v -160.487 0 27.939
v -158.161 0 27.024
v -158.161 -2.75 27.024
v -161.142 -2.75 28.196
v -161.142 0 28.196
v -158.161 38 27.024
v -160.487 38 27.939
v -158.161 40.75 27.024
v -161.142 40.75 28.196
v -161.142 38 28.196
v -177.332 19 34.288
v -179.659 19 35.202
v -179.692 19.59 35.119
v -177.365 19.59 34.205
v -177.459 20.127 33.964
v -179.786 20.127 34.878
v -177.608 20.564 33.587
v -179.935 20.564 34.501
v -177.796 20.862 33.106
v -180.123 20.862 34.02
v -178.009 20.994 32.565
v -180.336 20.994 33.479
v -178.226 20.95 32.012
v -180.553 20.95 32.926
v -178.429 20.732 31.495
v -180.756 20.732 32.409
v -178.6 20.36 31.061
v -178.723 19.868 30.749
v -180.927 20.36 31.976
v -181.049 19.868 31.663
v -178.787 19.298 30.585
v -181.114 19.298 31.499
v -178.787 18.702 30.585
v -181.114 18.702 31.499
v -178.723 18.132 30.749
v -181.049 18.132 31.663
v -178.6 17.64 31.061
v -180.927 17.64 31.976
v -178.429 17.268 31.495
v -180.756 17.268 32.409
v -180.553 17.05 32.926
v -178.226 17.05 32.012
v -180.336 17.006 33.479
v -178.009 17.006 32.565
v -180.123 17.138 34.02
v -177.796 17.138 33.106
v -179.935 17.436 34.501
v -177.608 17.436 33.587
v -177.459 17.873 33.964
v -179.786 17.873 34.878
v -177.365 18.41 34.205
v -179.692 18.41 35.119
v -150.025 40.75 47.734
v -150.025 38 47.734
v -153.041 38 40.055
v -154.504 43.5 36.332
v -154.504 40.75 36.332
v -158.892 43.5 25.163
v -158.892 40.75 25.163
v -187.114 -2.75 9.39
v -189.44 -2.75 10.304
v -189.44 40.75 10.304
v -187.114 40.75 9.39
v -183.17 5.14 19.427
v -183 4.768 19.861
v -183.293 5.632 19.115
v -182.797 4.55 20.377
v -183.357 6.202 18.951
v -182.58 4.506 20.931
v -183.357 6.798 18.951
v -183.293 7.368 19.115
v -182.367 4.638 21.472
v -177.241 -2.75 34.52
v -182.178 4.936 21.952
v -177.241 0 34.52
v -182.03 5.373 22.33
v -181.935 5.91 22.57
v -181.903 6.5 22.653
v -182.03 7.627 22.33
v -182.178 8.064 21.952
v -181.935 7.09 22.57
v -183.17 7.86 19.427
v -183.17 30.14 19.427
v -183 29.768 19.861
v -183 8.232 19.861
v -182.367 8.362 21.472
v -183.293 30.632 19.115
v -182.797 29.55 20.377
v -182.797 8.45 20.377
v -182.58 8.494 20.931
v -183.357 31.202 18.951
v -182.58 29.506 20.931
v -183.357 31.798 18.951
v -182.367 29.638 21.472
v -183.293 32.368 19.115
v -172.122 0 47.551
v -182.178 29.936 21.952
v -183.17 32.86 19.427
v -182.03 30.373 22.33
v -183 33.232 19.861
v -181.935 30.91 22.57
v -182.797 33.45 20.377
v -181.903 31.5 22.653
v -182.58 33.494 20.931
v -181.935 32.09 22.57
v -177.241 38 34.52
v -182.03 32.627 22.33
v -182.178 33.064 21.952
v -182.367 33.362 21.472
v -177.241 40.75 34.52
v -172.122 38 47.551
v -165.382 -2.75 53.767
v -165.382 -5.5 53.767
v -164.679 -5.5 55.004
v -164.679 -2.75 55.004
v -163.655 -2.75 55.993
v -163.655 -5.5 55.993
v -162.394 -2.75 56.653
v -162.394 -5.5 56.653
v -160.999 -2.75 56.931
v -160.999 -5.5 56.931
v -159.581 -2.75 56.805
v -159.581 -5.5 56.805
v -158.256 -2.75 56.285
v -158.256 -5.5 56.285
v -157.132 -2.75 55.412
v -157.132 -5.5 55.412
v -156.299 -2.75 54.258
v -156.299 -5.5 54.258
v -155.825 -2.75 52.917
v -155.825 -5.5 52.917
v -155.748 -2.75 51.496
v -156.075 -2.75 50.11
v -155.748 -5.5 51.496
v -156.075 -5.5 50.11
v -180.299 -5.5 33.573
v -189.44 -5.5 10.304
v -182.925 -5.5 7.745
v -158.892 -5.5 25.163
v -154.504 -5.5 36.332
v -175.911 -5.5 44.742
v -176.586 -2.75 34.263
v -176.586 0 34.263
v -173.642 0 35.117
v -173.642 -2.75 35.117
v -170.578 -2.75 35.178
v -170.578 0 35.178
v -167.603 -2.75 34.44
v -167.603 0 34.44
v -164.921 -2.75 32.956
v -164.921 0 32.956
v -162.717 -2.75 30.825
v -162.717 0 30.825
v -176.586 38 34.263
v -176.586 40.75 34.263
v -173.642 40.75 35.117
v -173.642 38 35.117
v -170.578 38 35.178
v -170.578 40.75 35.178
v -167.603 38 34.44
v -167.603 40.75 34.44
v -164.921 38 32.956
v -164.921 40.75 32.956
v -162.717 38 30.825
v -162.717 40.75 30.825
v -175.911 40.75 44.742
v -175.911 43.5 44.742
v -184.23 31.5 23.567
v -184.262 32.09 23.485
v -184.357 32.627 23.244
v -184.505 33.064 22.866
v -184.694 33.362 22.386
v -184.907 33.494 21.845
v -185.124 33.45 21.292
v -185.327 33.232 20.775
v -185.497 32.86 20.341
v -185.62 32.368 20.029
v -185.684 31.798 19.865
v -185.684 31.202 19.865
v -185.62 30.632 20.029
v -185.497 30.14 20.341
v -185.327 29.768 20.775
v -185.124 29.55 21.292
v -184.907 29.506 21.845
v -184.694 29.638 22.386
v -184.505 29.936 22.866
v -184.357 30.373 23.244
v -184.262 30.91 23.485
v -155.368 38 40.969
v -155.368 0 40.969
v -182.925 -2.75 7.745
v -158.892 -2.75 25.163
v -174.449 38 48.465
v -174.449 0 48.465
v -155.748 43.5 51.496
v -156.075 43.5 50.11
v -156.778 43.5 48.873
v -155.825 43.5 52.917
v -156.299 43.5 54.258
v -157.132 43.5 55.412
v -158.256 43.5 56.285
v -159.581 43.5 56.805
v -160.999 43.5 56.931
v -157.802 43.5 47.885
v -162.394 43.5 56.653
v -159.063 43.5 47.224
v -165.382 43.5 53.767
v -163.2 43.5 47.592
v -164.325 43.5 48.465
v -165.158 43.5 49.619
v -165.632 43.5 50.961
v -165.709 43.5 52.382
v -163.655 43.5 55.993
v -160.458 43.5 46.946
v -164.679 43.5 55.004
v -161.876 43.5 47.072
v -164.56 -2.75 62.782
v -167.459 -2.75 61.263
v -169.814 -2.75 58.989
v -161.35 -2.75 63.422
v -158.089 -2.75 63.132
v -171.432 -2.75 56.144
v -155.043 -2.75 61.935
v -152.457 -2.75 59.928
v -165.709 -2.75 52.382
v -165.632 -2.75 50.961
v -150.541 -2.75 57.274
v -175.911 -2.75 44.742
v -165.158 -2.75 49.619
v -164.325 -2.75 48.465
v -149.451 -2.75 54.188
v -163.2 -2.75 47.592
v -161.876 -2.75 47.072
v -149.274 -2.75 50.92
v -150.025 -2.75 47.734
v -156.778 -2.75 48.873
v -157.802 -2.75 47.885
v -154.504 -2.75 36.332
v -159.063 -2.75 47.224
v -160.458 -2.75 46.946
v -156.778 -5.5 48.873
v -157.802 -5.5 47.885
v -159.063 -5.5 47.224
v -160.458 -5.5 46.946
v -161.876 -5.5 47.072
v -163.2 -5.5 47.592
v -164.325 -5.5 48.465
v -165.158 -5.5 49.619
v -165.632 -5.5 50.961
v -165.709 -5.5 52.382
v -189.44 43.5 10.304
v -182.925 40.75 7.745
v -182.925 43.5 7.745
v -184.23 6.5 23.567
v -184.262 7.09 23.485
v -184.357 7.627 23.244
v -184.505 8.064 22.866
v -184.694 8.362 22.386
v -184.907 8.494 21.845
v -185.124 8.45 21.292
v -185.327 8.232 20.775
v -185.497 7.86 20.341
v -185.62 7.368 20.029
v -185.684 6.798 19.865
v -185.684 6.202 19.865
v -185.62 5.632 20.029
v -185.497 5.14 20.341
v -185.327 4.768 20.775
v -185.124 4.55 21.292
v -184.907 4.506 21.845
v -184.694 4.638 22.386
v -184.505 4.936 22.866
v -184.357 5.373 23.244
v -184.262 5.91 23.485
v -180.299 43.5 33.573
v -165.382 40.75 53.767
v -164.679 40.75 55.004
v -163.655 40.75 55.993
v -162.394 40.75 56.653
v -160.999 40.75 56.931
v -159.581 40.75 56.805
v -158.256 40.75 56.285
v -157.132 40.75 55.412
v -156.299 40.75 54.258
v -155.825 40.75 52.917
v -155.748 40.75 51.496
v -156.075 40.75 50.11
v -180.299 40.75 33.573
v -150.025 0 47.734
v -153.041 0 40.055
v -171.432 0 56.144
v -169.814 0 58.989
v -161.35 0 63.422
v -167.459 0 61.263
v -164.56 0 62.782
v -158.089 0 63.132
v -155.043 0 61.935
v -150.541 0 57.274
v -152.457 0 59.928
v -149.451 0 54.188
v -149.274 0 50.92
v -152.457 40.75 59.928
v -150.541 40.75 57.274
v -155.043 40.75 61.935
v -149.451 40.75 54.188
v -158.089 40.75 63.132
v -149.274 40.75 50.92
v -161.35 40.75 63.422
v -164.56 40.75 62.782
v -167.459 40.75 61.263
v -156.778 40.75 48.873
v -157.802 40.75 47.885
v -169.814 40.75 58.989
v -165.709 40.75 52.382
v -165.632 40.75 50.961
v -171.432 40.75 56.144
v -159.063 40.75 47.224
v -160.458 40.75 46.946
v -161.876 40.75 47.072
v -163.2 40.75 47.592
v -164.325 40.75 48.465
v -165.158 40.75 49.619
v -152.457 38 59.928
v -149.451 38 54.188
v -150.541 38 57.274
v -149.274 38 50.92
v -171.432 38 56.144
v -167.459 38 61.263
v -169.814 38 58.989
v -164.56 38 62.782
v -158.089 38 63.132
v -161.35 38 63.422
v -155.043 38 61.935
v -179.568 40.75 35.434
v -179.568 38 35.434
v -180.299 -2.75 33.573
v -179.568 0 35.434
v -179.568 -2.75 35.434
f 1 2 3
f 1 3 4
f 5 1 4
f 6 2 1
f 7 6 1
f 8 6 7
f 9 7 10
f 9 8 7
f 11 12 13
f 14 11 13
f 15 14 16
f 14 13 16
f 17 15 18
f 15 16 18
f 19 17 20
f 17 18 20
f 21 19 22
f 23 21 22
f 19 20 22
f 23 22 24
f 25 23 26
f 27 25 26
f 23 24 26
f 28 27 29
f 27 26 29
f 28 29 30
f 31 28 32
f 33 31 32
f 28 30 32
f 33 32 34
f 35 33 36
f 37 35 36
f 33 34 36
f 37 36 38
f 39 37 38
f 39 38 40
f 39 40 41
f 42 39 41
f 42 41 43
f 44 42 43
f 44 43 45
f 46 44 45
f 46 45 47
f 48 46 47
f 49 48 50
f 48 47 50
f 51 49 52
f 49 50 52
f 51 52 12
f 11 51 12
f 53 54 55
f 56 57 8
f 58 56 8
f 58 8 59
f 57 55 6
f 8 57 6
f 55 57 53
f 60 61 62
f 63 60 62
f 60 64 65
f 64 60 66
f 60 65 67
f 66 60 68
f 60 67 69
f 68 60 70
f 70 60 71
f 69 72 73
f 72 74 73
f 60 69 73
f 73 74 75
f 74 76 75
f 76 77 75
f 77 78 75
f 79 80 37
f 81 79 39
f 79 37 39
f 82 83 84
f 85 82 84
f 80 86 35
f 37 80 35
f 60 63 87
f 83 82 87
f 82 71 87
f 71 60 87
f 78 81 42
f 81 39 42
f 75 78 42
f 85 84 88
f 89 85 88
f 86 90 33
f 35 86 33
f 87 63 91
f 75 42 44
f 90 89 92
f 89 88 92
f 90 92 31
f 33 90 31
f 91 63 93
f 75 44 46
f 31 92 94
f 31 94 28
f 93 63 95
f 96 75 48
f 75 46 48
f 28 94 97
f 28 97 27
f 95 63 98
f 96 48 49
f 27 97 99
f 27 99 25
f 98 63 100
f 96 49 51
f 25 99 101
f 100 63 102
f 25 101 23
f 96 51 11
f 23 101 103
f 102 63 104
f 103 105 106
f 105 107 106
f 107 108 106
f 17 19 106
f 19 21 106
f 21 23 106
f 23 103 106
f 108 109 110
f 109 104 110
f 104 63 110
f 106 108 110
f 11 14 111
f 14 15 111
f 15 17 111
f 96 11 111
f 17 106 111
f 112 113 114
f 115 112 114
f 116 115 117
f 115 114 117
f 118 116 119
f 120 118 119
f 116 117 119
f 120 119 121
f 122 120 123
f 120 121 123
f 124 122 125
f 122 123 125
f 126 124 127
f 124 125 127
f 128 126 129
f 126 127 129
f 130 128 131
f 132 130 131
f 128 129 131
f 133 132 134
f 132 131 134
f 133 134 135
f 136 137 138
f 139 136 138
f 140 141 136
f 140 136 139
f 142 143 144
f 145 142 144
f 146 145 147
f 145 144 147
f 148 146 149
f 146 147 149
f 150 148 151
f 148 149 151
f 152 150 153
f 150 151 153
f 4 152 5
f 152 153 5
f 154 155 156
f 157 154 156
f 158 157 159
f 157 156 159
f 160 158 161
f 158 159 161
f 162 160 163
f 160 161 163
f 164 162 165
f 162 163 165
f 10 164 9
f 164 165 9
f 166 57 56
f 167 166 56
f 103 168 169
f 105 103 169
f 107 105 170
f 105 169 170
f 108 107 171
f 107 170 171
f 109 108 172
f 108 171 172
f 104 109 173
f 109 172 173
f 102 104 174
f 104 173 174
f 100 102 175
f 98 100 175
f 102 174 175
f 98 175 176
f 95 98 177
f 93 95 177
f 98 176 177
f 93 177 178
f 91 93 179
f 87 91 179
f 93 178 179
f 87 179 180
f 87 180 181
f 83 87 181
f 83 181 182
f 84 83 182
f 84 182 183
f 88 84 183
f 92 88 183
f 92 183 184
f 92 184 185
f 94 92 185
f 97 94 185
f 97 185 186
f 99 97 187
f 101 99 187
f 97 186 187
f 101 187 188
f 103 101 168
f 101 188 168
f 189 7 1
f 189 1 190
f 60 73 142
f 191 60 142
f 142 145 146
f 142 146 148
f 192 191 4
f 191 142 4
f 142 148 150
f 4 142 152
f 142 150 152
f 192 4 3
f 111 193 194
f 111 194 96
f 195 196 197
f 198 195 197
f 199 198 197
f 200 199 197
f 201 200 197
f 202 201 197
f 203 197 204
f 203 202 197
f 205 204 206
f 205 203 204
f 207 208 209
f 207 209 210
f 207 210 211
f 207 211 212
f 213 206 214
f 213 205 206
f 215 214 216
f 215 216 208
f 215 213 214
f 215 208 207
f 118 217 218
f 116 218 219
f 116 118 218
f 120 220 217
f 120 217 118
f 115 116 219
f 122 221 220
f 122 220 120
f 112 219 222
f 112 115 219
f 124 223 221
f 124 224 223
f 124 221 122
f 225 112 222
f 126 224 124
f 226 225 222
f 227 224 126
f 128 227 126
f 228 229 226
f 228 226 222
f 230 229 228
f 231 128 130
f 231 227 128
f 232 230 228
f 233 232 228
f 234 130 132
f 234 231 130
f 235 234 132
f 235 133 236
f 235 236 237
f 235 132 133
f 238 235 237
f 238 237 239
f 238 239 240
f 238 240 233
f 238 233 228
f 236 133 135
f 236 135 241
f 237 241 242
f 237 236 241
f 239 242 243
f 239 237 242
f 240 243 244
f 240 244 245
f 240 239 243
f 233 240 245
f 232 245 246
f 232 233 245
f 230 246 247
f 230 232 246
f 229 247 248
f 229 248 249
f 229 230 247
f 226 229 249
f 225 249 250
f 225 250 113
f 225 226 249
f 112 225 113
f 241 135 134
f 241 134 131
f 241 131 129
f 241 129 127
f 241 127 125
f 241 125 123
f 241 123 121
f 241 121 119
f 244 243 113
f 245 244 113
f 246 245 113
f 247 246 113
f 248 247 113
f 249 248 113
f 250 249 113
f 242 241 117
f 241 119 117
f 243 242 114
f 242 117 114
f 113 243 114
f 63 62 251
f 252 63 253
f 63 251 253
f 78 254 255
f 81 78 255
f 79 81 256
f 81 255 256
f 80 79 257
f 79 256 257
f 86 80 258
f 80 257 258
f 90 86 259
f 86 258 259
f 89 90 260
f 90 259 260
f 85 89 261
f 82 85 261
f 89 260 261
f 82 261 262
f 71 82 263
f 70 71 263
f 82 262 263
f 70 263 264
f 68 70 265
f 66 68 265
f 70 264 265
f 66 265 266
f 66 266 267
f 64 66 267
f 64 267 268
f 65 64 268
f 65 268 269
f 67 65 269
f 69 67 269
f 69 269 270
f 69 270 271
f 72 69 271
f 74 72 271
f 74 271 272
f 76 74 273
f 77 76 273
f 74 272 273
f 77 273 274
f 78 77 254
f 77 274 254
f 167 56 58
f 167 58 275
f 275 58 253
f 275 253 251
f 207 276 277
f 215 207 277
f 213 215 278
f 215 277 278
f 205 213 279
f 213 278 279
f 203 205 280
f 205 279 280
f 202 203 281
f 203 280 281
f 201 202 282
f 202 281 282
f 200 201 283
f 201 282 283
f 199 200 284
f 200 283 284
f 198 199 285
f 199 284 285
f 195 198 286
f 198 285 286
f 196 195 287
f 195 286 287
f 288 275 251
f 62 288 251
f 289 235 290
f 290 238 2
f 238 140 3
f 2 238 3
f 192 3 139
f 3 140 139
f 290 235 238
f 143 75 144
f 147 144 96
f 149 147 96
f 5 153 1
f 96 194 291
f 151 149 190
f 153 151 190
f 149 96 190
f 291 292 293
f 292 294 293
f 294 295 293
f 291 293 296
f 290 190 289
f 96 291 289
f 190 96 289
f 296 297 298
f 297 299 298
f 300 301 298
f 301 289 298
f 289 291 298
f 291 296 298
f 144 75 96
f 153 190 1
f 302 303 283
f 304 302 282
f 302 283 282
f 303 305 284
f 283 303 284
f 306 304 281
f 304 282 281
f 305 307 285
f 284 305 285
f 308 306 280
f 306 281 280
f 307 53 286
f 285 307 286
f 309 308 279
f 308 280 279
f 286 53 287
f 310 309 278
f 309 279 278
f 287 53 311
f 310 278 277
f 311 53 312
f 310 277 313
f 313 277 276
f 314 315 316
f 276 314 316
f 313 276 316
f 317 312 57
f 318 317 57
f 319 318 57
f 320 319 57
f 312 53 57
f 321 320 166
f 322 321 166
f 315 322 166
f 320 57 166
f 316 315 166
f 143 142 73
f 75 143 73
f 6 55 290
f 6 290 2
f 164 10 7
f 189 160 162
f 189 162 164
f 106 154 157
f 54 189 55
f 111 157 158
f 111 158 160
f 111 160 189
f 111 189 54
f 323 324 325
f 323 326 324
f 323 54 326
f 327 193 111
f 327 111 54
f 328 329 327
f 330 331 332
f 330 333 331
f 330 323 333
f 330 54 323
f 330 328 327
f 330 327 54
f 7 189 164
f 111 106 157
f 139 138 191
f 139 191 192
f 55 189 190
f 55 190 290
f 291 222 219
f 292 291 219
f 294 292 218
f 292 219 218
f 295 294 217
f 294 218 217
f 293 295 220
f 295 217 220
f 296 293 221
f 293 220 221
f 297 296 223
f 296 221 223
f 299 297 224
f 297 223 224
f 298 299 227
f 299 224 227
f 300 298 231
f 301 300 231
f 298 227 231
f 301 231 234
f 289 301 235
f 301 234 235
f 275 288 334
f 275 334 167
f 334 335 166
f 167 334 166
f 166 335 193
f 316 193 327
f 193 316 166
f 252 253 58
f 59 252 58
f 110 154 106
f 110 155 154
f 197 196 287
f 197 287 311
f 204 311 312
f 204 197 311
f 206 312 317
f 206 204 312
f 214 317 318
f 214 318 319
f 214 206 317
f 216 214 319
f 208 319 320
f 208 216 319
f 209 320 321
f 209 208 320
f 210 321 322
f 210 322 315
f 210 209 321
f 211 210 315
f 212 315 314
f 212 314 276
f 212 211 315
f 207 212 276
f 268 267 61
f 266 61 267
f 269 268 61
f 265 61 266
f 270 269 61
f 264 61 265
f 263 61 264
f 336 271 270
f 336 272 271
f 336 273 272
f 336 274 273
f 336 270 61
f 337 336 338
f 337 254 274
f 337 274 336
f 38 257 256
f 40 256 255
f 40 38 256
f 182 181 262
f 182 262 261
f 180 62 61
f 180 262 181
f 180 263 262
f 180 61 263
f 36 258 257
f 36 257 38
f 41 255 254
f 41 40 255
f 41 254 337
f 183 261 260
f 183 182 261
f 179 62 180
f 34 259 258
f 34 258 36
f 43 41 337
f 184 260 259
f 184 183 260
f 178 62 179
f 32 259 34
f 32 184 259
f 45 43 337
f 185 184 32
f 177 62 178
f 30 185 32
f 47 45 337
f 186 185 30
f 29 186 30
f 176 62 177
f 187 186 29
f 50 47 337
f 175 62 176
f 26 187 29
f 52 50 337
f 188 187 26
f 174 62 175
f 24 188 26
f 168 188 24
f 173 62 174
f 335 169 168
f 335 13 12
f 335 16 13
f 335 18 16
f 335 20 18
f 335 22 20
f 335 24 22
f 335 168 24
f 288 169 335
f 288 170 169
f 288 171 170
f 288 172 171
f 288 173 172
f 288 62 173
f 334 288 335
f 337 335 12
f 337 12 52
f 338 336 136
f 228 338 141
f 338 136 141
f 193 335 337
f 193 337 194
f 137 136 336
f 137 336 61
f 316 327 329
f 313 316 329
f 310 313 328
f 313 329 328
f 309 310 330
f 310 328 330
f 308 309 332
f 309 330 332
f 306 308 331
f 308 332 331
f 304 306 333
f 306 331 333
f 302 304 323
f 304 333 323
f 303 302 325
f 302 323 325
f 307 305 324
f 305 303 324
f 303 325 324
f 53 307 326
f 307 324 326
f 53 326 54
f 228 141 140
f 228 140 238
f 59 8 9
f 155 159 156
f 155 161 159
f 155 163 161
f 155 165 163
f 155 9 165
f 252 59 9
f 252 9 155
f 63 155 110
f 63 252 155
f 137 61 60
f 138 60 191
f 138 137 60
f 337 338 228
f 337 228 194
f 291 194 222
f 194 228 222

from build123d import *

# Parameters (mm, degrees)
SALIENTE_EXTRUIR1_START   = -2.75
SALIENTE_EXTRUIR1_DEPTH   = 5.5
SALIENTE_EXTRUIR1_2_DEPTH = 2.75
SALIENTE_EXTRUIR2_DEPTH   = 38
SALIENTE_EXTRUIR3_START   = 2.75
SALIENTE_EXTRUIR3_DEPTH   = 2.75
CROQUIS4_W                = 23
CROQUIS4_H                = 43.5
CORTAR_EXTRUIR1_DEPTH     = 8.25
CORTAR_EXTRUIR2_DEPTH     = 2.75
CROQUIS6_W                = 38
CROQUIS6_H                = 22.249999999
CORTAR_EXTRUIR3_DEPTH     = 16.59246817
CROQUIS7_W                = 3.203765914
CROQUIS7_H                = 38
CORTAR_EXTRUIR4_DEPTH     = 8.25
CROQUIS8_W                = 3.203765916
CROQUIS8_H                = 38
CORTAR_EXTRUIR5_DEPTH     = 8.25
CROQUIS9_W                = 14
CROQUIS9_H                = 38
CORTAR_EXTRUIR6_DEPTH     = 0.703765915
CROQUIS10_W               = 14
CROQUIS10_H               = 38
CORTAR_EXTRUIR7_DEPTH     = 0.703765915
SALIENTE_EXTRUIR4_START   = 2.75
SALIENTE_EXTRUIR4_DEPTH   = 2.75
CORTAR_EXTRUIR8_DEPTH     = 2.75
CROQUIS13_W               = 12.249999999
CROQUIS13_H               = 2.75
CORTAR_EXTRUIR9_DEPTH     = 74.034358614
CROQUIS14_W               = 12.249999999
CROQUIS14_H               = 2.75
CORTAR_EXTRUIR10_DEPTH    = 74.034358614
CROQUIS15_W               = 5
CROQUIS15_H               = 2.75
CROQUIS16_W               = 5
CROQUIS16_H               = 2.75
TALADRO1_D                = 10.15
TALADRO1_DEPTH            = 2.75
TALADRO2_D                = 10.15
CORTAR_EXTRUIR11_DEPTH    = 2.75
CORTAR_EXTRUIR12_START    = -2.75
CORTAR_EXTRUIR12_DEPTH    = 2.75
CORTAR_EXTRUIR13_REACH    = 202.135
SALIENTE_EXTRUIR5_DEPTH   = 2.75
SALIENTE_EXTRUIR6_DEPTH   = 2.75
CROQUIS26_W               = 27
CROQUIS26_H               = 43.5
SALIENTE_EXTRUIR7_DEPTH   = 2.5
CROQUIS27_R               = 2
CORTAR_EXTRUIR14_DEPTH    = 2.5


with BuildPart() as part:
    # Saliente-Extruir1: read off the stored shape, not the designer's step
    # Saliente-Extruir1 outline → Saliente-Extruir1 (new body)
    with BuildSketch(Plane(origin=(0, 40.75, 0), x_dir=(-1, 0, 0), z_dir=(0, 1, 0)).offset(SALIENTE_EXTRUIR1_START)):
        with BuildLine():
            Line((161.177139208, 19.345694485), (182.584423689, 27.755698719))
            Line((182.584423689, 27.755698719), (171.432026769, 56.143619441))
            ThreePointArc((171.432026769, 56.143619441), (156.523382412, 62.642259564), (150.024742289, 47.733615207))
            Line((150.024742289, 47.733615207), (161.177139208, 19.345694485))
        make_face()
    extrude(amount=SALIENTE_EXTRUIR1_DEPTH)

    # Saliente-Extruir1 2 outline → Saliente-Extruir1 2 (add)
    with BuildSketch(Plane(origin=(0, 40.75, 0), x_dir=(-1, 0, 0), z_dir=(0, 1, 0))):
        with BuildLine():
            ThreePointArc((161.177139208, 19.345694485), (176.085783565, 12.847054362), (182.584423687, 27.755698719))
            Line((182.584423687, 27.755698719), (161.177139208, 19.345694485))
        make_face()
    extrude(amount=SALIENTE_EXTRUIR1_2_DEPTH)

    # Croquis2 → Saliente-Extruir2 (add)
    with BuildSketch(Plane.XZ.offset(-38)):
        Polygon((-171.432026768, 56.143619442), (-150.024742288, 47.733615205), (-161.177139209, 19.345694483), (-182.584423689, 27.755698719), align=None)
    extrude(amount=SALIENTE_EXTRUIR2_DEPTH)

    # Croquis3 → Saliente-Extruir3 (add)
    with BuildSketch(Plane.XZ.offset(SALIENTE_EXTRUIR3_START)):
        with BuildLine():
            Line((-182.584423688, 27.755698719), (-171.432026768, 56.143619441))
            ThreePointArc((-171.432026768, 56.143619441), (-156.523382412, 62.642259564), (-150.024742289, 47.733615207))
            Line((-150.024742289, 47.733615207), (-161.177139208, 19.345694485))
            Line((-161.177139208, 19.345694485), (-182.584423688, 27.755698719))
        make_face()
    extrude(amount=-SALIENTE_EXTRUIR3_DEPTH)

    # Croquis4 → Cortar-Extruir1 (cut)
    with BuildSketch(Plane(origin=(-14.965700114, 0, -38.094511116), x_dir=(-0.9307514991056489, 0, 0.3656523580022251), z_dir=(-0.3656523580022251, 0, -0.9307514991056489))):
        with Locations((168.589662745, 19)):
            Rectangle(CROQUIS4_W, CROQUIS4_H)
    extrude(amount=-CORTAR_EXTRUIR1_DEPTH, mode=Mode.SUBTRACT)

    # Croquis5 → Cortar-Extruir2 (cut)
    with BuildSketch(Plane(origin=(0, 40.75, 0), x_dir=(1, 0, 0), z_dir=(0, 1, 0))):
        with BuildLine():
            Line((-161.142417183, -28.195858914), (-176.585881806, -34.262934025))
            ThreePointArc((-176.585881806, -34.262934025), (-167.602648859, -34.440489141), (-161.142417183, -28.195858914))
        make_face()
    extrude(amount=-CORTAR_EXTRUIR2_DEPTH, mode=Mode.SUBTRACT)

    # Croquis6 → Cortar-Extruir3 (cut)
    with BuildSketch(Plane(origin=(-149.193349022, 0, 58.611670162), x_dir=(0, 1, 0), z_dir=(0.9307514991056486, 0, -0.3656523580022258))):
        with Locations((19, -21.553766865)):
            Rectangle(CROQUIS6_W, CROQUIS6_H)
    extrude(amount=-CORTAR_EXTRUIR3_DEPTH, mode=Mode.SUBTRACT)

    # Croquis7 → Cortar-Extruir4 (cut)
    with BuildSketch(Plane(origin=(-3.8133032, 0, -9.706590403), x_dir=(0.9307514990825102, 0, -0.36565235806112356), z_dir=(0.36565235806112356, 0, 0.9307514990825102))):
        with Locations((-158.691545702, 19)):
            Rectangle(CROQUIS7_W, CROQUIS7_H)
    extrude(amount=-CORTAR_EXTRUIR4_DEPTH, mode=Mode.SUBTRACT)

    # Croquis8 → Cortar-Extruir5 (cut)
    with BuildSketch(Plane(origin=(-3.8133032, 0, -9.706590403), x_dir=(0.9307514990825102, 0, -0.36565235806112356), z_dir=(0.36565235806112356, 0, 0.9307514990825102))):
        with Locations((-178.487779787, 19)):
            Rectangle(CROQUIS8_W, CROQUIS8_H)
    extrude(amount=-CORTAR_EXTRUIR5_DEPTH, mode=Mode.SUBTRACT)

    # Croquis9 → Cortar-Extruir6 (cut)
    with BuildSketch(Plane(origin=(-164.636813645, 0, 64.678745273), x_dir=(-0.3656523580022247, 0, -0.930751499105649), z_dir=(0.930751499105649, 1.4355340193330324e-15, -0.3656523580022247))):
        with Locations((25.678766864, 19)):
            Rectangle(CROQUIS9_W, CROQUIS9_H)
    extrude(amount=-CORTAR_EXTRUIR6_DEPTH, mode=Mode.SUBTRACT)

    # Croquis10 → Cortar-Extruir7 (cut)
    with BuildSketch(Plane(origin=(-149.193349022, 0, 58.611670162), x_dir=(0.3656523580022248, 0, 0.930751499105649), z_dir=(-0.930751499105649, -1.4355340193330322e-15, 0.3656523580022248))):
        with Locations((-25.678766864, 19)):
            Rectangle(CROQUIS10_W, CROQUIS10_H)
    extrude(amount=-CORTAR_EXTRUIR7_DEPTH, mode=Mode.SUBTRACT)

    # Croquis11 → Saliente-Extruir4 (add)
    with BuildSketch(Plane.XZ.offset(2.75).offset(SALIENTE_EXTRUIR4_START)):
        with BuildLine():
            Line((-150.024742289, 47.733615207), (-161.177139208, 19.345694485))
            ThreePointArc((-161.177139208, 19.345694485), (-176.085783565, 12.847054362), (-182.584423687, 27.755698719))
            Line((-182.584423687, 27.755698719), (-171.432026769, 56.143619441))
            ThreePointArc((-171.432026769, 56.143619441), (-156.523382412, 62.642259564), (-150.024742289, 47.733615207))
        make_face()
    extrude(amount=-SALIENTE_EXTRUIR4_DEPTH)

    # Croquis12 → Cortar-Extruir8 (cut)
    with BuildSketch(Plane(origin=(0, 0, 0), x_dir=(-1, 0, 0), z_dir=(0, 1, 0))):
        with BuildLine():
            Line((161.142417183, 28.195858914), (176.585881806, 34.262934025))
            ThreePointArc((176.585881806, 34.262934025), (167.602648859, 34.440489141), (161.142417183, 28.195858914))
        make_face()
    extrude(amount=-CORTAR_EXTRUIR8_DEPTH, mode=Mode.SUBTRACT)

    # Croquis13 → Cortar-Extruir9 (cut, through all)
    with BuildSketch(Plane(origin=(-146.211439094, 0, 57.440205601), x_dir=(-0.36565235800222584, 0, -0.9307514991056486), z_dir=(0.9307514991056486, 0, -0.36565235800222584))):
        with Locations((16.553766864, -4.125)):
            Rectangle(CROQUIS13_W, CROQUIS13_H)
    extrude(amount=-CORTAR_EXTRUIR9_DEPTH, mode=Mode.SUBTRACT)

    # Croquis14 → Cortar-Extruir10 (cut, through all)
    with BuildSketch(Plane(origin=(-146.211439094, 0, 57.440205601), x_dir=(-0.36565235800222584, 0, -0.9307514991056486), z_dir=(0.9307514991056486, 0, -0.36565235800222584))):
        with Locations((16.553766864, 42.125)):
            Rectangle(CROQUIS14_W, CROQUIS14_H)
    extrude(amount=-CORTAR_EXTRUIR10_DEPTH, mode=Mode.SUBTRACT)

    # Croquis15 → Revolución1 (revolve)
    with BuildSketch(Plane(origin=(0, 0, 51.938617325), x_dir=(-1, 0, 0), z_dir=(0, 0, -1))):
        with Locations((158.228384529, -4.125)):
            Rectangle(CROQUIS15_W, CROQUIS15_H)
    revolve(axis=Axis((-160.728384529, -5.5, 51.938617325), (0, 1, 0)))

    # Croquis16 → Revolución2 (revolve)
    with BuildSketch(Plane(origin=(0, 0, 51.938617325), x_dir=(-1, 0, 0), z_dir=(0, 0, -1))):
        with Locations((158.228384529, 42.125)):
            Rectangle(CROQUIS16_W, CROQUIS16_H)
    revolve(axis=Axis((-160.728384529, 40.75, 51.938617325), (0, 1, 0)))

    # Taladro1
    with Locations(Plane(origin=(0, -5.5, 0), x_dir=(-1, 0, 0), z_dir=(0, -1, 0))):
        with Locations((171.880781448, -23.550696602)):
            Hole(TALADRO1_D / 2, depth=TALADRO1_DEPTH)

    # Taladro2 (through all)
    with Locations(Plane(origin=(0, 40.75, 0), x_dir=(-1, 0, 0), z_dir=(0, -1, 0))):
        with Locations((171.880781448, -23.550696602)):
            Hole(TALADRO2_D / 2)

    # Croquis21 → Cortar-Extruir11 (cut)
    with BuildSketch(Plane.XZ.offset(5.5)):
        with BuildLine():
            ThreePointArc((-165.382142024, 53.766879114), (-158.900122739, 56.59237482), (-156.074627033, 50.110355534))
            Line((-156.074627033, 50.110355534), (-150.024742289, 47.733615207))
            ThreePointArc((-150.024742289, 47.733615207), (-156.523382412, 62.642259564), (-171.432026769, 56.143619441))
            Line((-171.432026769, 56.143619441), (-165.382142024, 53.766879114))
        make_face()
    extrude(amount=-CORTAR_EXTRUIR11_DEPTH, mode=Mode.SUBTRACT)

    # Croquis22 → Cortar-Extruir12 (cut)
    with BuildSketch(Plane(origin=(0, 43.5, 0), x_dir=(1, 0, 0), z_dir=(0, 1, 0)).offset(CORTAR_EXTRUIR12_START)):
        with BuildLine():
            ThreePointArc((-165.382142024, -53.766879115), (-158.900122739, -56.59237482), (-156.074627033, -50.110355534))
            Line((-156.074627033, -50.110355534), (-150.024742289, -47.733615207))
            ThreePointArc((-150.024742289, -47.733615207), (-156.523382412, -62.642259564), (-171.432026769, -56.143619442))
            Line((-171.432026769, -56.143619442), (-165.382142024, -53.766879115))
        make_face()
    extrude(amount=CORTAR_EXTRUIR12_DEPTH, mode=Mode.SUBTRACT)

    # Cortar-Extruir13: up to this face of the body (flat: up to its plane)
    cortar_extruir13_end = Plane(part.part.faces().sort_by_distance((-169.996704911, 43.5, 28.346528005))[0])
    # Croquis23 → Cortar-Extruir13 (cut, up to the picked face)
    with BuildSketch(Plane.XZ.offset(5.5), mode=Mode.PRIVATE) as cortar_extruir13_sk1:
        Polygon((-180.29909645, 33.572895588), (-158.891811971, 25.162891354), (-166.204859131, 6.547861372), (-187.61214361, 14.957865606), align=None)
    cortar_extruir13_tool1 = split(extrude(cortar_extruir13_sk1.sketch, amount=-CORTAR_EXTRUIR13_REACH, mode=Mode.PRIVATE), bisect_by=cortar_extruir13_end, keep=Keep.BOTH, mode=Mode.PRIVATE)
    add(cortar_extruir13_tool1.solids().sort_by(Axis((-173.251978, -5.5, 20.060378), (0, 1, 0)))[0], mode=Mode.SUBTRACT)

    # Croquis24 → Saliente-Extruir5 (add)
    with BuildSketch(Plane.XZ.offset(5.5)):
        Polygon((-180.29909645, 33.572895588), (-189.4404054, 10.304108111), (-182.925144906, 7.744541605), (-158.891811971, 25.162891354), align=None)
    extrude(amount=-SALIENTE_EXTRUIR5_DEPTH)

    # Croquis25 → Saliente-Extruir6 (add)
    with BuildSketch(Plane(origin=(0, 43.5, 0), x_dir=(1, 0, 0), z_dir=(0, 1, 0))):
        Polygon((-180.29909645, -33.572895588), (-189.4404054, -10.304108111), (-182.925144906, -7.744541605), (-158.891811971, -25.162891354), align=None)
    extrude(amount=-SALIENTE_EXTRUIR6_DEPTH)

    # Croquis26 → Saliente-Extruir7 (add)
    with BuildSketch(Plane(origin=(-167.618723573, 0, 65.850209835), x_dir=(0.36565235800222584, 0, 0.9307514991056486), z_dir=(-0.9307514991056486, 0, 0.36565235800222584))):
        with Locations((-46.178766864, 19)):
            Rectangle(CROQUIS26_W, CROQUIS26_H)
    extrude(amount=-SALIENTE_EXTRUIR7_DEPTH)

    # Croquis27 → Cortar-Extruir14 (cut)
    with BuildSketch(Plane(origin=(-167.618723573, 0, 65.850209835), x_dir=(0.36565235800222584, 0, 0.9307514991056486), z_dir=(-0.9307514991056486, 0, 0.36565235800222584))):
        with Locations((-47.428766864, 31.5)):
            Circle(CROQUIS27_R)
        with Locations((-47.428766864, 6.5)):
            Circle(CROQUIS27_R)
        with Locations((-34.928766864, 19)):
            Circle(CROQUIS27_R)
    extrude(amount=-CORTAR_EXTRUIR14_DEPTH, mode=Mode.SUBTRACT)


solid = part.part
